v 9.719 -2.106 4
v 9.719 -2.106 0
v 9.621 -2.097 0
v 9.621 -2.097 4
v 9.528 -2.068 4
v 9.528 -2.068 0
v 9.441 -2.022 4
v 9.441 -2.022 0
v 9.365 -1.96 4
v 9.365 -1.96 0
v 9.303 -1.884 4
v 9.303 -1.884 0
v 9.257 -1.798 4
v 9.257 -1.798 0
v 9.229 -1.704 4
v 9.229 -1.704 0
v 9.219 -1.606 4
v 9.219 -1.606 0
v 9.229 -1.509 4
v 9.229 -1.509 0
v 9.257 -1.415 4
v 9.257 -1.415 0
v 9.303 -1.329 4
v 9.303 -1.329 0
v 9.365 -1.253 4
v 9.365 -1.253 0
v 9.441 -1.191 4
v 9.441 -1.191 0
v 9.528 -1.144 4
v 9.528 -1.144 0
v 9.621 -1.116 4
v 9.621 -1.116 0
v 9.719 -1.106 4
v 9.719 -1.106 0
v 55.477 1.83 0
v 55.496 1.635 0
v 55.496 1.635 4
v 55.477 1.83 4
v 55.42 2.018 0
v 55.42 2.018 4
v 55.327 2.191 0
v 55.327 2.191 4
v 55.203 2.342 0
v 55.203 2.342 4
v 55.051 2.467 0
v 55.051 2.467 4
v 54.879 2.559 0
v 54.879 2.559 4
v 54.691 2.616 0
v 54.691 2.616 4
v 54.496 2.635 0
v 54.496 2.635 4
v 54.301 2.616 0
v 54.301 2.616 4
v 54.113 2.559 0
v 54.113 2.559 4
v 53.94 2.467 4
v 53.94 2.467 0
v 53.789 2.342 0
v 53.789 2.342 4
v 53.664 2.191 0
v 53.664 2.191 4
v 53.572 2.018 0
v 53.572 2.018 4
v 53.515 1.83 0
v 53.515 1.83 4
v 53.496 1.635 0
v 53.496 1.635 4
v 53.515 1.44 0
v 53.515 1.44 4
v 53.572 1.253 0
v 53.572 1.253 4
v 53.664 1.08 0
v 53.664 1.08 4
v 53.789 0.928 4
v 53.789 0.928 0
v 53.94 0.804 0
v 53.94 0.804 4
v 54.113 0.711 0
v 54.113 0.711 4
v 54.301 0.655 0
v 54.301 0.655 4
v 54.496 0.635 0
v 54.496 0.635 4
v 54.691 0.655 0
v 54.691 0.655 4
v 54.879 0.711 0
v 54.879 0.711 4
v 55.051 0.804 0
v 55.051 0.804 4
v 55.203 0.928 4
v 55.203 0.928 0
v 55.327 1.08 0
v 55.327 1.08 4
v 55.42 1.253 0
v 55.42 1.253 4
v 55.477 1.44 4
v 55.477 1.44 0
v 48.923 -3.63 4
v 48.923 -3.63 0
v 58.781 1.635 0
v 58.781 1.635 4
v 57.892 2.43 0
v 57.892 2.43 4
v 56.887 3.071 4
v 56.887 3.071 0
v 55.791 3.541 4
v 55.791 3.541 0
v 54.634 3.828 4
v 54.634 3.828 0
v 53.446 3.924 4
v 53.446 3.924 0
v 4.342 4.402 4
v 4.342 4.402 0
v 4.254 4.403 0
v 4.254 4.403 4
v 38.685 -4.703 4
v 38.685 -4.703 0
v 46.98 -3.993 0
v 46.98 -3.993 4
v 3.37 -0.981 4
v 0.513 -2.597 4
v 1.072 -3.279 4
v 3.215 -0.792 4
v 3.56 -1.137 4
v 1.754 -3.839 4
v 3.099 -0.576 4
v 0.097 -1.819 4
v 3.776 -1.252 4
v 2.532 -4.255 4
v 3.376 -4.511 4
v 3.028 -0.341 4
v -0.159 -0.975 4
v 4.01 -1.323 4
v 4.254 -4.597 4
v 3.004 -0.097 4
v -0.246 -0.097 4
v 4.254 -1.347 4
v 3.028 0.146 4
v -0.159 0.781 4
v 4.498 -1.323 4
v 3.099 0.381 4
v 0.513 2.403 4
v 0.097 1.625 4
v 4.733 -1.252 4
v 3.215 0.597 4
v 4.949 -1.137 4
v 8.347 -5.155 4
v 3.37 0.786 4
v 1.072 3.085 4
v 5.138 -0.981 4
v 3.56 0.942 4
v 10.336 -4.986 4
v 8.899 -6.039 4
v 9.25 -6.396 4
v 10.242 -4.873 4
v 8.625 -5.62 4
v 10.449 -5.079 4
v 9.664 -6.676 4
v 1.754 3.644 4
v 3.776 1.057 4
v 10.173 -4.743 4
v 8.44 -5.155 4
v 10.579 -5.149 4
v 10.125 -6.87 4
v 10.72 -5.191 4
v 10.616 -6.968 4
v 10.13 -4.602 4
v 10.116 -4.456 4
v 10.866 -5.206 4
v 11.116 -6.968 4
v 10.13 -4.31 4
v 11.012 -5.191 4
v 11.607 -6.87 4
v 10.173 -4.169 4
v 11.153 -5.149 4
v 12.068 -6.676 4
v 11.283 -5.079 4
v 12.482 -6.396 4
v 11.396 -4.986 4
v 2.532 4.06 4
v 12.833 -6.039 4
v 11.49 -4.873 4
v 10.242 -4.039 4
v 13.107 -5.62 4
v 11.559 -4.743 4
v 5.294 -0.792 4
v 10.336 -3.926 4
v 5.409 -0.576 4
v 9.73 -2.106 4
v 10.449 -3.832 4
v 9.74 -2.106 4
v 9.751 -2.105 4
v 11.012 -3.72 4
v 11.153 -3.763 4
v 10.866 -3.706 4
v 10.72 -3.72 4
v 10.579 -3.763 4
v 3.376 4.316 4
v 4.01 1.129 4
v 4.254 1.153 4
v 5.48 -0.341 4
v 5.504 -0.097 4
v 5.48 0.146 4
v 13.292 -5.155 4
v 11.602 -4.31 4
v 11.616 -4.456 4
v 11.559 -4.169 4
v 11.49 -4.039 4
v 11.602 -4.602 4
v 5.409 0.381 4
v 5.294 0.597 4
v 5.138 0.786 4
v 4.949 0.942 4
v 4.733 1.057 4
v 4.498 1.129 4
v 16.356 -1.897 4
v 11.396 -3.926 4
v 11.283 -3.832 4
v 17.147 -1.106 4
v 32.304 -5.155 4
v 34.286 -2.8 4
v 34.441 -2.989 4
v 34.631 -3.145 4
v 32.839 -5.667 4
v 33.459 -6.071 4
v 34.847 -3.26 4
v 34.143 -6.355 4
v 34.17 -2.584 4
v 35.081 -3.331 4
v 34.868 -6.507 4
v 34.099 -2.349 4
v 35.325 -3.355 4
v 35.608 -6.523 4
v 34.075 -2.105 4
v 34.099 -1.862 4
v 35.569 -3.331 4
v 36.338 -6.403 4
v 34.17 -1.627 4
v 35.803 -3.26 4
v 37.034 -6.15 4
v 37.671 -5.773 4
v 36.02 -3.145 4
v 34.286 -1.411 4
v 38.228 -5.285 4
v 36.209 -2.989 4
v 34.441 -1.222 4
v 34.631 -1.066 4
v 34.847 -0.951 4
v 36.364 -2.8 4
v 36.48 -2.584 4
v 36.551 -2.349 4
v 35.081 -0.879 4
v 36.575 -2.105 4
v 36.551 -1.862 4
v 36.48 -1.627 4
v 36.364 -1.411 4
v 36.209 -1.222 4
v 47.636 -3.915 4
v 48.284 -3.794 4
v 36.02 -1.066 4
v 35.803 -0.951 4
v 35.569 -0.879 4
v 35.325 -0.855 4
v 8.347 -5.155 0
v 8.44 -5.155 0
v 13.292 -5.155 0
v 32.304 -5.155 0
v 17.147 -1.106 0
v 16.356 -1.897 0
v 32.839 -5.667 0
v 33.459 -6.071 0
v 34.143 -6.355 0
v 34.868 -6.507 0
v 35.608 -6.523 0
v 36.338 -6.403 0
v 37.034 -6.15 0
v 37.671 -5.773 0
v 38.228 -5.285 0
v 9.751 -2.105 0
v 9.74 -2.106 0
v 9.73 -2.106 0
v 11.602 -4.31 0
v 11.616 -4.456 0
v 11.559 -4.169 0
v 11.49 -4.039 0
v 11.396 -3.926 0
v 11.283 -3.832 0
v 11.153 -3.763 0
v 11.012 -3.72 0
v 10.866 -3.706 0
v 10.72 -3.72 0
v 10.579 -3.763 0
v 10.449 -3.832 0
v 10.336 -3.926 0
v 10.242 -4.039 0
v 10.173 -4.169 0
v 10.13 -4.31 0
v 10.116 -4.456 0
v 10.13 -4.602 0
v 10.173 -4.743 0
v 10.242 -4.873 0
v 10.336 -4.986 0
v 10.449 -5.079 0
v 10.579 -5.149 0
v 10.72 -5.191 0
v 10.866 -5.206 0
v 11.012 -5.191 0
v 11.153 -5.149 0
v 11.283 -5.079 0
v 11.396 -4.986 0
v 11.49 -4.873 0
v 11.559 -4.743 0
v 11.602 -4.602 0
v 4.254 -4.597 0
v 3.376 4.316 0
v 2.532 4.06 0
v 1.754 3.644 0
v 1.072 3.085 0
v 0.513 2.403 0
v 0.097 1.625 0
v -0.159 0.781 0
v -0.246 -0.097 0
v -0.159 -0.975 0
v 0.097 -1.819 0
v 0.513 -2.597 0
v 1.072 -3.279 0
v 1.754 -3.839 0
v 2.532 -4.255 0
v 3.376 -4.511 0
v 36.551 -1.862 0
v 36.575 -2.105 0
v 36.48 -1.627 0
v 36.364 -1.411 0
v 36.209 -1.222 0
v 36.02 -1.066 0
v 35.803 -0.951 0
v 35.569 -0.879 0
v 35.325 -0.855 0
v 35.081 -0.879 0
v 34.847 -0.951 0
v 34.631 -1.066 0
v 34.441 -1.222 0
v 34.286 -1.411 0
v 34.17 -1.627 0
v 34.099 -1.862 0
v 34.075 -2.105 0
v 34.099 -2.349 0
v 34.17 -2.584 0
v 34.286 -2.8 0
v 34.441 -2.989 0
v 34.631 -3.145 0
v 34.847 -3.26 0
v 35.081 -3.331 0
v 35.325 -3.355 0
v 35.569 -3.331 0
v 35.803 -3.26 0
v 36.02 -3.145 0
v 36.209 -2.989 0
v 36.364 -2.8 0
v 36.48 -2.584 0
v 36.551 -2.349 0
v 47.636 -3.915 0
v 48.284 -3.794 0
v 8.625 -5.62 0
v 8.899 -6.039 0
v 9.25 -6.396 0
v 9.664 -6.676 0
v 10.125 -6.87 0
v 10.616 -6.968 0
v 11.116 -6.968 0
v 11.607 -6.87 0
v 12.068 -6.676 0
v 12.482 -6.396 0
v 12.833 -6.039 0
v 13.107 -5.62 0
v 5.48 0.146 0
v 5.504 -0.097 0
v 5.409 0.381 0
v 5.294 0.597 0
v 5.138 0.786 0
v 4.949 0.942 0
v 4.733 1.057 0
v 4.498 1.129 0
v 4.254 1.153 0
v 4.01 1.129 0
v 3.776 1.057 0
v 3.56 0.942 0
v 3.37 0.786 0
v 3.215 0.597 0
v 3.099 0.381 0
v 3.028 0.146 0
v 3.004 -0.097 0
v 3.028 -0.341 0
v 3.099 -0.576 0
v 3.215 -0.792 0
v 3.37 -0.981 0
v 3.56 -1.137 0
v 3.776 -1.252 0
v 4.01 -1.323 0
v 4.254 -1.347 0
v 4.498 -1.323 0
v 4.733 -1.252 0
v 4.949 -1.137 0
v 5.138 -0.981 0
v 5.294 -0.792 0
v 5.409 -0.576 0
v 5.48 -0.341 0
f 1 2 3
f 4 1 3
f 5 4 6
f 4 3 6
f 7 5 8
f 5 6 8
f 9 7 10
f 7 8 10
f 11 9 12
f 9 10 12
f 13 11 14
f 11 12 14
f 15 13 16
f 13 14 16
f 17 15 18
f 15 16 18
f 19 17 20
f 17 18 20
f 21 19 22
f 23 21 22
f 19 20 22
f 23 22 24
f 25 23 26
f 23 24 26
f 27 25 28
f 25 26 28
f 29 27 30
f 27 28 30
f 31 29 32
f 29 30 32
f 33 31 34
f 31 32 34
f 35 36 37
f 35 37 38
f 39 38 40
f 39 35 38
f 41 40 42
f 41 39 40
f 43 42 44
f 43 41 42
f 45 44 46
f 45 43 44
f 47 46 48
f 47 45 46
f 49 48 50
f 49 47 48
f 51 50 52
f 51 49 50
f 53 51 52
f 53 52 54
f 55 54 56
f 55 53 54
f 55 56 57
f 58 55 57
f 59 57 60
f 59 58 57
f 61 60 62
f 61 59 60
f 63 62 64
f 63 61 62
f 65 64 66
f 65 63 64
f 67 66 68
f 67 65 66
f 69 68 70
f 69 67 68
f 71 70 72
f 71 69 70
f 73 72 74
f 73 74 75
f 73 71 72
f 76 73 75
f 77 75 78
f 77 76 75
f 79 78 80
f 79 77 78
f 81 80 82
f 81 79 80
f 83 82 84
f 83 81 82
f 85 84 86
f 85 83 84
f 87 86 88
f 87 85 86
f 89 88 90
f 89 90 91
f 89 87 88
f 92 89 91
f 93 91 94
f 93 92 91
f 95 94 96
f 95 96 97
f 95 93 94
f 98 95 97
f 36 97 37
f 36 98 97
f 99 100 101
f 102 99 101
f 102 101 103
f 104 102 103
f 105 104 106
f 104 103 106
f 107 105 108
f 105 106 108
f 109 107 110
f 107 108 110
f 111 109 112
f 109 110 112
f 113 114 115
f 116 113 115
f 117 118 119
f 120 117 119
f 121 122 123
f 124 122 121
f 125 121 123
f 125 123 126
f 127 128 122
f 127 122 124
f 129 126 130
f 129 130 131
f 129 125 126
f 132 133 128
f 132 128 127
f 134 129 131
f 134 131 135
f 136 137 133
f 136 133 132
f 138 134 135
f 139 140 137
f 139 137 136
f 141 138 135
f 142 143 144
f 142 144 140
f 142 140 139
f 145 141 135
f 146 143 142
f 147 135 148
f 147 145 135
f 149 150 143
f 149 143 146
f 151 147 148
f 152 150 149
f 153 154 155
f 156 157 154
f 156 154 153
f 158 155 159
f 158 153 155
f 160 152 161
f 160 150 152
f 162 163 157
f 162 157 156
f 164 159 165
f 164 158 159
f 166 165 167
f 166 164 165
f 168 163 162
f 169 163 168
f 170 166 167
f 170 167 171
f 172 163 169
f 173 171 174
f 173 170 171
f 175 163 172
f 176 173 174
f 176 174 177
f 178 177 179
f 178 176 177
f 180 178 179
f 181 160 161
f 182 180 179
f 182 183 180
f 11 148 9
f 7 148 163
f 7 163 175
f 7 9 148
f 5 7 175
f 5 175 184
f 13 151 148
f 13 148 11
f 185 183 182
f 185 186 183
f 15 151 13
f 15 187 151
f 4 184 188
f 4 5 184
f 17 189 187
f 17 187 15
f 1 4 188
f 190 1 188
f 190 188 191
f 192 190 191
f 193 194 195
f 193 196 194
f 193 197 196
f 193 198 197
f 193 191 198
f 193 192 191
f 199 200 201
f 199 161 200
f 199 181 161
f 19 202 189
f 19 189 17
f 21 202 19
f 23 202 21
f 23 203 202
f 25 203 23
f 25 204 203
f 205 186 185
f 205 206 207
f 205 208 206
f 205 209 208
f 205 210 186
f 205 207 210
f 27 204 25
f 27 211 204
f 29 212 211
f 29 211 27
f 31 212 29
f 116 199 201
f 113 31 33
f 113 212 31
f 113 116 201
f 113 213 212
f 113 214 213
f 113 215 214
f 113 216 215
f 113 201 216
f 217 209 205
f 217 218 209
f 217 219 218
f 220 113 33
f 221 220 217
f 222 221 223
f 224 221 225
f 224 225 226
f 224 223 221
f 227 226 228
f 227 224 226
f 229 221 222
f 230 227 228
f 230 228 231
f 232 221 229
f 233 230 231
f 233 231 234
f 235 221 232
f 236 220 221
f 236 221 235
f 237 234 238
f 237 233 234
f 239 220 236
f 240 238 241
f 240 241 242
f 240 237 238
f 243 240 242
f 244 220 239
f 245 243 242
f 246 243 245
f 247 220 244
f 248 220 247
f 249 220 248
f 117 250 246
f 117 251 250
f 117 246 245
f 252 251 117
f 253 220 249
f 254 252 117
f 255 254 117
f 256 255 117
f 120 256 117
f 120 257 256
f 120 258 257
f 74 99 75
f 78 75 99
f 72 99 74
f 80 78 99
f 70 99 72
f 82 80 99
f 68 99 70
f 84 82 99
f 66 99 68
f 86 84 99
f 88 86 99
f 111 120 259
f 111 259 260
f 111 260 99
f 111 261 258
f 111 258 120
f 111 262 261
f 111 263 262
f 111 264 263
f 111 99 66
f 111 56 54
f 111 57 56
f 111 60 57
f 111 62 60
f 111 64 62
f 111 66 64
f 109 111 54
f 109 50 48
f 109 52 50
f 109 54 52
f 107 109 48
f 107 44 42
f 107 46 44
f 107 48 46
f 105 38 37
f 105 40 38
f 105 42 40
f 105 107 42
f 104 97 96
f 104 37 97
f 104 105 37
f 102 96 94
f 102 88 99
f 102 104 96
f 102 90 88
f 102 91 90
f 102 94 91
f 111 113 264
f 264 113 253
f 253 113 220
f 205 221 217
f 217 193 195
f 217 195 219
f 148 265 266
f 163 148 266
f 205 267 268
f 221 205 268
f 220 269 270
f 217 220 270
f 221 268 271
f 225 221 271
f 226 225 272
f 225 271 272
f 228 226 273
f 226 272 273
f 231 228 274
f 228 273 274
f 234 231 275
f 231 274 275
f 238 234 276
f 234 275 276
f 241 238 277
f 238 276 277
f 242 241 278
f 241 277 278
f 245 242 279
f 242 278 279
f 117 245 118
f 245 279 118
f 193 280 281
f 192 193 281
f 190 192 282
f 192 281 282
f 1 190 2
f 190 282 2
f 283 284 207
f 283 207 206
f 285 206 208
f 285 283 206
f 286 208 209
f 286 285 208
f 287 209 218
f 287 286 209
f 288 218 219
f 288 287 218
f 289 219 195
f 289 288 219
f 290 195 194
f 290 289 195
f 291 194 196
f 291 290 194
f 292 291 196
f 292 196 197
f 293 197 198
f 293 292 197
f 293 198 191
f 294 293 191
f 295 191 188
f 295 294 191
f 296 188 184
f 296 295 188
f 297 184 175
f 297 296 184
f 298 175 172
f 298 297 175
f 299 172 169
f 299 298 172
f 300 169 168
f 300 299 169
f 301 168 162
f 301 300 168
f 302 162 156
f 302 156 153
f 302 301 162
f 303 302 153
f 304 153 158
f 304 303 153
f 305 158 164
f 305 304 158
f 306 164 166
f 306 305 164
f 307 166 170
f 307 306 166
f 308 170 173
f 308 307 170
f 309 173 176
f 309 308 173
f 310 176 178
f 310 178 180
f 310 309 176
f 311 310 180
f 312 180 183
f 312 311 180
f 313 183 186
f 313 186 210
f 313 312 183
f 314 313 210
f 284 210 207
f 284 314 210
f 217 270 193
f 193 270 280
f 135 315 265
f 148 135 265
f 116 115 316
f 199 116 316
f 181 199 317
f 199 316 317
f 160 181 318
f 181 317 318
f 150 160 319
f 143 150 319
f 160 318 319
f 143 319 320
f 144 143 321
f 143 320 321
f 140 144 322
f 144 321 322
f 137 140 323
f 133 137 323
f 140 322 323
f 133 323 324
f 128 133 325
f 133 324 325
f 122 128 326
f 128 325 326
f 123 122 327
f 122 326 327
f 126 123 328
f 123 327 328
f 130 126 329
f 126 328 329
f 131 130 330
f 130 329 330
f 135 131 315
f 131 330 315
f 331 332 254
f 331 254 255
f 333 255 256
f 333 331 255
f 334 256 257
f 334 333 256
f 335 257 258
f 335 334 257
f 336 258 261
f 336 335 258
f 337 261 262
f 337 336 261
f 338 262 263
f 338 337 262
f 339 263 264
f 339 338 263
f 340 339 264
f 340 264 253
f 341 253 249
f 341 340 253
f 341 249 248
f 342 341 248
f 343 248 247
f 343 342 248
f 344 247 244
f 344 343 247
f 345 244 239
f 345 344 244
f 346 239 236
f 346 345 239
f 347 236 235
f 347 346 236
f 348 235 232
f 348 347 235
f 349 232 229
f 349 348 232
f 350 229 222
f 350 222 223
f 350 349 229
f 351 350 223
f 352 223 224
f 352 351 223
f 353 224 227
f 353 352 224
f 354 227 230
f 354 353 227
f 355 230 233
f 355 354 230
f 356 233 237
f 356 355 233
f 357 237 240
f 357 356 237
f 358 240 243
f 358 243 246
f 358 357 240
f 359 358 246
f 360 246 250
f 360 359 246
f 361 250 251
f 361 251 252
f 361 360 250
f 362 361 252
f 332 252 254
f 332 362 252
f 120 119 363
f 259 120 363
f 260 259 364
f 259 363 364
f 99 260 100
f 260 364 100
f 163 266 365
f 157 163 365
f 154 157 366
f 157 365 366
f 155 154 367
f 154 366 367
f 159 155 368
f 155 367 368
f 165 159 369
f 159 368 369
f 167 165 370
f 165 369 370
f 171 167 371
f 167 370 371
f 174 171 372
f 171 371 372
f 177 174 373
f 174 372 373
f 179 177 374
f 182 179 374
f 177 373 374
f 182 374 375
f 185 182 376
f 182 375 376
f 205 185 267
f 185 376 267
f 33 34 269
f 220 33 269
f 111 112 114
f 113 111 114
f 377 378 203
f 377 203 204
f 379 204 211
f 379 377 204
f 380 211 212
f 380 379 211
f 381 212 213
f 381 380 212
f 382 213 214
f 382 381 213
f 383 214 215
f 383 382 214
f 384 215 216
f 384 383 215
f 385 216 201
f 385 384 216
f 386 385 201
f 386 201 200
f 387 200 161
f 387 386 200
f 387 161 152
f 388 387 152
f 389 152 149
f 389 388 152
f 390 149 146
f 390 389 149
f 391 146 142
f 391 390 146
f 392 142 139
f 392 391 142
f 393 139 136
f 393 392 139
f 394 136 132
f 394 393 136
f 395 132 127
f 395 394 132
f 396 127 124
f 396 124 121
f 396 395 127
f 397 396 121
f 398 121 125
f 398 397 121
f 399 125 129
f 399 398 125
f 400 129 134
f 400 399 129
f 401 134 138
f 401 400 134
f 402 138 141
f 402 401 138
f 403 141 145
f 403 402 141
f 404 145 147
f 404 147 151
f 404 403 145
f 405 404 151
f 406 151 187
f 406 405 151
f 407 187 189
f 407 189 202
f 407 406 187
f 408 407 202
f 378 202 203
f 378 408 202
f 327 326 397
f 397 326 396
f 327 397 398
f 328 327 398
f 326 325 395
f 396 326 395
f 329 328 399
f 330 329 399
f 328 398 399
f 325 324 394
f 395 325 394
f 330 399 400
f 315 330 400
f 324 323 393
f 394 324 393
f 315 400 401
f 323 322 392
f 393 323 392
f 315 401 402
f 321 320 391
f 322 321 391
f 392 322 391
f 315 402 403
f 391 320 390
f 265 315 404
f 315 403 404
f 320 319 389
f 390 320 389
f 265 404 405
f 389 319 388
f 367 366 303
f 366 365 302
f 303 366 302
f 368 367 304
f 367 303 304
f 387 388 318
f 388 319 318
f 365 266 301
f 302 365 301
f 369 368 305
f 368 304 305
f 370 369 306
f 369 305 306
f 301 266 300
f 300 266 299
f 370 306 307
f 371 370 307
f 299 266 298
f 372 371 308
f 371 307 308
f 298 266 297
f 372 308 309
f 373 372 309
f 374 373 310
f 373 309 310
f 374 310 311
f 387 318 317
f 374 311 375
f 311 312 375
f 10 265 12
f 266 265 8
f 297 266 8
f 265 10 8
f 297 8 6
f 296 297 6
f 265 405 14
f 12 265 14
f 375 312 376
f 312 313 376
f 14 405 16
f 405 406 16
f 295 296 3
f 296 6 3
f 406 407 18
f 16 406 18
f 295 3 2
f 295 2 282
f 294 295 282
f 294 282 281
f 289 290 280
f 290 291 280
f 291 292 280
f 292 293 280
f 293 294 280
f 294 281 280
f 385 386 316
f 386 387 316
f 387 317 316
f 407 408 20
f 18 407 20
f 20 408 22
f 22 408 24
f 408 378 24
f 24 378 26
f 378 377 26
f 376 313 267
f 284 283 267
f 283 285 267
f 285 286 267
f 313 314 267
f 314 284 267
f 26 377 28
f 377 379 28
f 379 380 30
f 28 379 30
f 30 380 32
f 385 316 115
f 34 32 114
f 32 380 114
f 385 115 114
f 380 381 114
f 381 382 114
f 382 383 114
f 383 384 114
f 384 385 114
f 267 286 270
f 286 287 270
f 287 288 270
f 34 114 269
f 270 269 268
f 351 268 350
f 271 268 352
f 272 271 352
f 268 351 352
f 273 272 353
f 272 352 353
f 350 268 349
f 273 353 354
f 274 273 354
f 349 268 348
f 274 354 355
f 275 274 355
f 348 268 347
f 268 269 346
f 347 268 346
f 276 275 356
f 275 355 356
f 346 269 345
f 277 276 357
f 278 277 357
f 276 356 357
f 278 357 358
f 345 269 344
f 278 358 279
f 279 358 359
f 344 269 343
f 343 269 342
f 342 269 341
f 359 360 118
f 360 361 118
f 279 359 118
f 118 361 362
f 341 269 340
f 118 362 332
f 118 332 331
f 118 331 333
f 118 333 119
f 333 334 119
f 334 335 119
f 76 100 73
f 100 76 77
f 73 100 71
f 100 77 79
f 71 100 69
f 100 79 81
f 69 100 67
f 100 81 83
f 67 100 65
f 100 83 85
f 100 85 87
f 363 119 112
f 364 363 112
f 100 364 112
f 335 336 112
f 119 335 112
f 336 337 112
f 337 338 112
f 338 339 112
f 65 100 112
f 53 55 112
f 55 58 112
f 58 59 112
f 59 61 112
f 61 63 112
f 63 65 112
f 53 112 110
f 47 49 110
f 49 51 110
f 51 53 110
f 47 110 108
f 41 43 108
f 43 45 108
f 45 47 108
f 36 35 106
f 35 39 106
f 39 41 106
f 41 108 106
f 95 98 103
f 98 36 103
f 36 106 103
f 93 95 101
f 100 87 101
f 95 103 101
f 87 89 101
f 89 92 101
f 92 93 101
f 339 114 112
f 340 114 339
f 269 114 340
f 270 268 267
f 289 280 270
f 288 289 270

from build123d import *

# Parameters (mm, degrees)
SKETCH1_R           = 0.75
SKETCH1_R_2         = 1.25
SKETCH1_R_3         = 1
BOSS_EXTRUDE1_DEPTH = 4


with BuildPart() as part:
    # Sketch1 → Boss-Extrude1 (new body)
    with BuildSketch(Plane.XY):
        with BuildLine():
            ThreePointArc((46.980351469, -3.99295605), (47.960883487, -3.859840066), (48.923458954, -3.63046837))
            Line((48.923458954, -3.63046837), (58.781132355, 1.635320677))
            ThreePointArc((58.781132355, 1.635320677), (56.34843078, 3.327817207), (53.445513313, 3.924182561))
            Line((53.445513313, 3.924182561), (4.34174303, 4.401750396))
            Line((4.34174303, 4.401750396), (4.254220138, 4.402601616))
            ThreePointArc((4.254220138, 4.402601616), (-0.245779862, -0.097398384), (4.254220138, -4.597398384))
            Line((4.254220138, -4.597398384), (8.346946684, -5.15524466))
            Line((8.346946684, -5.15524466), (8.439838836, -5.15524466))
            ThreePointArc((8.439838836, -5.15524466), (10.866040294, -6.980836707), (13.292241752, -5.15524466))
            Line((13.292241752, -5.15524466), (24.292241752, -5.15524466))
            Line((24.292241752, -5.15524466), (32.304248164, -5.15524466))
            ThreePointArc((32.304248164, -5.15524466), (35.607637679, -6.523335594), (38.685278543, -4.70339554))
            Line((38.685278543, -4.70339554), (46.980351469, -3.99295605))
        make_face()
        with Locations((10.866040294, -4.455836707)):
            Circle(SKETCH1_R, mode=Mode.SUBTRACT)
        with BuildLine():
            ThreePointArc((9.719017648, -2.106433547), (9.219017648, -1.606433547), (9.719017648, -1.106433547))
            Line((9.719017648, -1.106433547), (17.146734956, -1.106433547))
            Line((17.146734956, -1.106433547), (16.355916602, -1.897251901))
            Line((16.355916602, -1.897251901), (9.750504349, -2.10544115))
            ThreePointArc((9.750504349, -2.10544115), (9.734768816, -2.106185386), (9.719017648, -2.106433547))
        make_face(mode=Mode.SUBTRACT)
        with Locations((35.325099909, -2.10544115)):
            Circle(SKETCH1_R_2, mode=Mode.SUBTRACT)
        with Locations((4.254220138, -0.097398384)):
            Circle(SKETCH1_R_2, mode=Mode.SUBTRACT)
        with Locations((54.495894224, 1.635320677)):
            Circle(SKETCH1_R_3, mode=Mode.SUBTRACT)
    extrude(amount=BOSS_EXTRUDE1_DEPTH)


solid = part.part
